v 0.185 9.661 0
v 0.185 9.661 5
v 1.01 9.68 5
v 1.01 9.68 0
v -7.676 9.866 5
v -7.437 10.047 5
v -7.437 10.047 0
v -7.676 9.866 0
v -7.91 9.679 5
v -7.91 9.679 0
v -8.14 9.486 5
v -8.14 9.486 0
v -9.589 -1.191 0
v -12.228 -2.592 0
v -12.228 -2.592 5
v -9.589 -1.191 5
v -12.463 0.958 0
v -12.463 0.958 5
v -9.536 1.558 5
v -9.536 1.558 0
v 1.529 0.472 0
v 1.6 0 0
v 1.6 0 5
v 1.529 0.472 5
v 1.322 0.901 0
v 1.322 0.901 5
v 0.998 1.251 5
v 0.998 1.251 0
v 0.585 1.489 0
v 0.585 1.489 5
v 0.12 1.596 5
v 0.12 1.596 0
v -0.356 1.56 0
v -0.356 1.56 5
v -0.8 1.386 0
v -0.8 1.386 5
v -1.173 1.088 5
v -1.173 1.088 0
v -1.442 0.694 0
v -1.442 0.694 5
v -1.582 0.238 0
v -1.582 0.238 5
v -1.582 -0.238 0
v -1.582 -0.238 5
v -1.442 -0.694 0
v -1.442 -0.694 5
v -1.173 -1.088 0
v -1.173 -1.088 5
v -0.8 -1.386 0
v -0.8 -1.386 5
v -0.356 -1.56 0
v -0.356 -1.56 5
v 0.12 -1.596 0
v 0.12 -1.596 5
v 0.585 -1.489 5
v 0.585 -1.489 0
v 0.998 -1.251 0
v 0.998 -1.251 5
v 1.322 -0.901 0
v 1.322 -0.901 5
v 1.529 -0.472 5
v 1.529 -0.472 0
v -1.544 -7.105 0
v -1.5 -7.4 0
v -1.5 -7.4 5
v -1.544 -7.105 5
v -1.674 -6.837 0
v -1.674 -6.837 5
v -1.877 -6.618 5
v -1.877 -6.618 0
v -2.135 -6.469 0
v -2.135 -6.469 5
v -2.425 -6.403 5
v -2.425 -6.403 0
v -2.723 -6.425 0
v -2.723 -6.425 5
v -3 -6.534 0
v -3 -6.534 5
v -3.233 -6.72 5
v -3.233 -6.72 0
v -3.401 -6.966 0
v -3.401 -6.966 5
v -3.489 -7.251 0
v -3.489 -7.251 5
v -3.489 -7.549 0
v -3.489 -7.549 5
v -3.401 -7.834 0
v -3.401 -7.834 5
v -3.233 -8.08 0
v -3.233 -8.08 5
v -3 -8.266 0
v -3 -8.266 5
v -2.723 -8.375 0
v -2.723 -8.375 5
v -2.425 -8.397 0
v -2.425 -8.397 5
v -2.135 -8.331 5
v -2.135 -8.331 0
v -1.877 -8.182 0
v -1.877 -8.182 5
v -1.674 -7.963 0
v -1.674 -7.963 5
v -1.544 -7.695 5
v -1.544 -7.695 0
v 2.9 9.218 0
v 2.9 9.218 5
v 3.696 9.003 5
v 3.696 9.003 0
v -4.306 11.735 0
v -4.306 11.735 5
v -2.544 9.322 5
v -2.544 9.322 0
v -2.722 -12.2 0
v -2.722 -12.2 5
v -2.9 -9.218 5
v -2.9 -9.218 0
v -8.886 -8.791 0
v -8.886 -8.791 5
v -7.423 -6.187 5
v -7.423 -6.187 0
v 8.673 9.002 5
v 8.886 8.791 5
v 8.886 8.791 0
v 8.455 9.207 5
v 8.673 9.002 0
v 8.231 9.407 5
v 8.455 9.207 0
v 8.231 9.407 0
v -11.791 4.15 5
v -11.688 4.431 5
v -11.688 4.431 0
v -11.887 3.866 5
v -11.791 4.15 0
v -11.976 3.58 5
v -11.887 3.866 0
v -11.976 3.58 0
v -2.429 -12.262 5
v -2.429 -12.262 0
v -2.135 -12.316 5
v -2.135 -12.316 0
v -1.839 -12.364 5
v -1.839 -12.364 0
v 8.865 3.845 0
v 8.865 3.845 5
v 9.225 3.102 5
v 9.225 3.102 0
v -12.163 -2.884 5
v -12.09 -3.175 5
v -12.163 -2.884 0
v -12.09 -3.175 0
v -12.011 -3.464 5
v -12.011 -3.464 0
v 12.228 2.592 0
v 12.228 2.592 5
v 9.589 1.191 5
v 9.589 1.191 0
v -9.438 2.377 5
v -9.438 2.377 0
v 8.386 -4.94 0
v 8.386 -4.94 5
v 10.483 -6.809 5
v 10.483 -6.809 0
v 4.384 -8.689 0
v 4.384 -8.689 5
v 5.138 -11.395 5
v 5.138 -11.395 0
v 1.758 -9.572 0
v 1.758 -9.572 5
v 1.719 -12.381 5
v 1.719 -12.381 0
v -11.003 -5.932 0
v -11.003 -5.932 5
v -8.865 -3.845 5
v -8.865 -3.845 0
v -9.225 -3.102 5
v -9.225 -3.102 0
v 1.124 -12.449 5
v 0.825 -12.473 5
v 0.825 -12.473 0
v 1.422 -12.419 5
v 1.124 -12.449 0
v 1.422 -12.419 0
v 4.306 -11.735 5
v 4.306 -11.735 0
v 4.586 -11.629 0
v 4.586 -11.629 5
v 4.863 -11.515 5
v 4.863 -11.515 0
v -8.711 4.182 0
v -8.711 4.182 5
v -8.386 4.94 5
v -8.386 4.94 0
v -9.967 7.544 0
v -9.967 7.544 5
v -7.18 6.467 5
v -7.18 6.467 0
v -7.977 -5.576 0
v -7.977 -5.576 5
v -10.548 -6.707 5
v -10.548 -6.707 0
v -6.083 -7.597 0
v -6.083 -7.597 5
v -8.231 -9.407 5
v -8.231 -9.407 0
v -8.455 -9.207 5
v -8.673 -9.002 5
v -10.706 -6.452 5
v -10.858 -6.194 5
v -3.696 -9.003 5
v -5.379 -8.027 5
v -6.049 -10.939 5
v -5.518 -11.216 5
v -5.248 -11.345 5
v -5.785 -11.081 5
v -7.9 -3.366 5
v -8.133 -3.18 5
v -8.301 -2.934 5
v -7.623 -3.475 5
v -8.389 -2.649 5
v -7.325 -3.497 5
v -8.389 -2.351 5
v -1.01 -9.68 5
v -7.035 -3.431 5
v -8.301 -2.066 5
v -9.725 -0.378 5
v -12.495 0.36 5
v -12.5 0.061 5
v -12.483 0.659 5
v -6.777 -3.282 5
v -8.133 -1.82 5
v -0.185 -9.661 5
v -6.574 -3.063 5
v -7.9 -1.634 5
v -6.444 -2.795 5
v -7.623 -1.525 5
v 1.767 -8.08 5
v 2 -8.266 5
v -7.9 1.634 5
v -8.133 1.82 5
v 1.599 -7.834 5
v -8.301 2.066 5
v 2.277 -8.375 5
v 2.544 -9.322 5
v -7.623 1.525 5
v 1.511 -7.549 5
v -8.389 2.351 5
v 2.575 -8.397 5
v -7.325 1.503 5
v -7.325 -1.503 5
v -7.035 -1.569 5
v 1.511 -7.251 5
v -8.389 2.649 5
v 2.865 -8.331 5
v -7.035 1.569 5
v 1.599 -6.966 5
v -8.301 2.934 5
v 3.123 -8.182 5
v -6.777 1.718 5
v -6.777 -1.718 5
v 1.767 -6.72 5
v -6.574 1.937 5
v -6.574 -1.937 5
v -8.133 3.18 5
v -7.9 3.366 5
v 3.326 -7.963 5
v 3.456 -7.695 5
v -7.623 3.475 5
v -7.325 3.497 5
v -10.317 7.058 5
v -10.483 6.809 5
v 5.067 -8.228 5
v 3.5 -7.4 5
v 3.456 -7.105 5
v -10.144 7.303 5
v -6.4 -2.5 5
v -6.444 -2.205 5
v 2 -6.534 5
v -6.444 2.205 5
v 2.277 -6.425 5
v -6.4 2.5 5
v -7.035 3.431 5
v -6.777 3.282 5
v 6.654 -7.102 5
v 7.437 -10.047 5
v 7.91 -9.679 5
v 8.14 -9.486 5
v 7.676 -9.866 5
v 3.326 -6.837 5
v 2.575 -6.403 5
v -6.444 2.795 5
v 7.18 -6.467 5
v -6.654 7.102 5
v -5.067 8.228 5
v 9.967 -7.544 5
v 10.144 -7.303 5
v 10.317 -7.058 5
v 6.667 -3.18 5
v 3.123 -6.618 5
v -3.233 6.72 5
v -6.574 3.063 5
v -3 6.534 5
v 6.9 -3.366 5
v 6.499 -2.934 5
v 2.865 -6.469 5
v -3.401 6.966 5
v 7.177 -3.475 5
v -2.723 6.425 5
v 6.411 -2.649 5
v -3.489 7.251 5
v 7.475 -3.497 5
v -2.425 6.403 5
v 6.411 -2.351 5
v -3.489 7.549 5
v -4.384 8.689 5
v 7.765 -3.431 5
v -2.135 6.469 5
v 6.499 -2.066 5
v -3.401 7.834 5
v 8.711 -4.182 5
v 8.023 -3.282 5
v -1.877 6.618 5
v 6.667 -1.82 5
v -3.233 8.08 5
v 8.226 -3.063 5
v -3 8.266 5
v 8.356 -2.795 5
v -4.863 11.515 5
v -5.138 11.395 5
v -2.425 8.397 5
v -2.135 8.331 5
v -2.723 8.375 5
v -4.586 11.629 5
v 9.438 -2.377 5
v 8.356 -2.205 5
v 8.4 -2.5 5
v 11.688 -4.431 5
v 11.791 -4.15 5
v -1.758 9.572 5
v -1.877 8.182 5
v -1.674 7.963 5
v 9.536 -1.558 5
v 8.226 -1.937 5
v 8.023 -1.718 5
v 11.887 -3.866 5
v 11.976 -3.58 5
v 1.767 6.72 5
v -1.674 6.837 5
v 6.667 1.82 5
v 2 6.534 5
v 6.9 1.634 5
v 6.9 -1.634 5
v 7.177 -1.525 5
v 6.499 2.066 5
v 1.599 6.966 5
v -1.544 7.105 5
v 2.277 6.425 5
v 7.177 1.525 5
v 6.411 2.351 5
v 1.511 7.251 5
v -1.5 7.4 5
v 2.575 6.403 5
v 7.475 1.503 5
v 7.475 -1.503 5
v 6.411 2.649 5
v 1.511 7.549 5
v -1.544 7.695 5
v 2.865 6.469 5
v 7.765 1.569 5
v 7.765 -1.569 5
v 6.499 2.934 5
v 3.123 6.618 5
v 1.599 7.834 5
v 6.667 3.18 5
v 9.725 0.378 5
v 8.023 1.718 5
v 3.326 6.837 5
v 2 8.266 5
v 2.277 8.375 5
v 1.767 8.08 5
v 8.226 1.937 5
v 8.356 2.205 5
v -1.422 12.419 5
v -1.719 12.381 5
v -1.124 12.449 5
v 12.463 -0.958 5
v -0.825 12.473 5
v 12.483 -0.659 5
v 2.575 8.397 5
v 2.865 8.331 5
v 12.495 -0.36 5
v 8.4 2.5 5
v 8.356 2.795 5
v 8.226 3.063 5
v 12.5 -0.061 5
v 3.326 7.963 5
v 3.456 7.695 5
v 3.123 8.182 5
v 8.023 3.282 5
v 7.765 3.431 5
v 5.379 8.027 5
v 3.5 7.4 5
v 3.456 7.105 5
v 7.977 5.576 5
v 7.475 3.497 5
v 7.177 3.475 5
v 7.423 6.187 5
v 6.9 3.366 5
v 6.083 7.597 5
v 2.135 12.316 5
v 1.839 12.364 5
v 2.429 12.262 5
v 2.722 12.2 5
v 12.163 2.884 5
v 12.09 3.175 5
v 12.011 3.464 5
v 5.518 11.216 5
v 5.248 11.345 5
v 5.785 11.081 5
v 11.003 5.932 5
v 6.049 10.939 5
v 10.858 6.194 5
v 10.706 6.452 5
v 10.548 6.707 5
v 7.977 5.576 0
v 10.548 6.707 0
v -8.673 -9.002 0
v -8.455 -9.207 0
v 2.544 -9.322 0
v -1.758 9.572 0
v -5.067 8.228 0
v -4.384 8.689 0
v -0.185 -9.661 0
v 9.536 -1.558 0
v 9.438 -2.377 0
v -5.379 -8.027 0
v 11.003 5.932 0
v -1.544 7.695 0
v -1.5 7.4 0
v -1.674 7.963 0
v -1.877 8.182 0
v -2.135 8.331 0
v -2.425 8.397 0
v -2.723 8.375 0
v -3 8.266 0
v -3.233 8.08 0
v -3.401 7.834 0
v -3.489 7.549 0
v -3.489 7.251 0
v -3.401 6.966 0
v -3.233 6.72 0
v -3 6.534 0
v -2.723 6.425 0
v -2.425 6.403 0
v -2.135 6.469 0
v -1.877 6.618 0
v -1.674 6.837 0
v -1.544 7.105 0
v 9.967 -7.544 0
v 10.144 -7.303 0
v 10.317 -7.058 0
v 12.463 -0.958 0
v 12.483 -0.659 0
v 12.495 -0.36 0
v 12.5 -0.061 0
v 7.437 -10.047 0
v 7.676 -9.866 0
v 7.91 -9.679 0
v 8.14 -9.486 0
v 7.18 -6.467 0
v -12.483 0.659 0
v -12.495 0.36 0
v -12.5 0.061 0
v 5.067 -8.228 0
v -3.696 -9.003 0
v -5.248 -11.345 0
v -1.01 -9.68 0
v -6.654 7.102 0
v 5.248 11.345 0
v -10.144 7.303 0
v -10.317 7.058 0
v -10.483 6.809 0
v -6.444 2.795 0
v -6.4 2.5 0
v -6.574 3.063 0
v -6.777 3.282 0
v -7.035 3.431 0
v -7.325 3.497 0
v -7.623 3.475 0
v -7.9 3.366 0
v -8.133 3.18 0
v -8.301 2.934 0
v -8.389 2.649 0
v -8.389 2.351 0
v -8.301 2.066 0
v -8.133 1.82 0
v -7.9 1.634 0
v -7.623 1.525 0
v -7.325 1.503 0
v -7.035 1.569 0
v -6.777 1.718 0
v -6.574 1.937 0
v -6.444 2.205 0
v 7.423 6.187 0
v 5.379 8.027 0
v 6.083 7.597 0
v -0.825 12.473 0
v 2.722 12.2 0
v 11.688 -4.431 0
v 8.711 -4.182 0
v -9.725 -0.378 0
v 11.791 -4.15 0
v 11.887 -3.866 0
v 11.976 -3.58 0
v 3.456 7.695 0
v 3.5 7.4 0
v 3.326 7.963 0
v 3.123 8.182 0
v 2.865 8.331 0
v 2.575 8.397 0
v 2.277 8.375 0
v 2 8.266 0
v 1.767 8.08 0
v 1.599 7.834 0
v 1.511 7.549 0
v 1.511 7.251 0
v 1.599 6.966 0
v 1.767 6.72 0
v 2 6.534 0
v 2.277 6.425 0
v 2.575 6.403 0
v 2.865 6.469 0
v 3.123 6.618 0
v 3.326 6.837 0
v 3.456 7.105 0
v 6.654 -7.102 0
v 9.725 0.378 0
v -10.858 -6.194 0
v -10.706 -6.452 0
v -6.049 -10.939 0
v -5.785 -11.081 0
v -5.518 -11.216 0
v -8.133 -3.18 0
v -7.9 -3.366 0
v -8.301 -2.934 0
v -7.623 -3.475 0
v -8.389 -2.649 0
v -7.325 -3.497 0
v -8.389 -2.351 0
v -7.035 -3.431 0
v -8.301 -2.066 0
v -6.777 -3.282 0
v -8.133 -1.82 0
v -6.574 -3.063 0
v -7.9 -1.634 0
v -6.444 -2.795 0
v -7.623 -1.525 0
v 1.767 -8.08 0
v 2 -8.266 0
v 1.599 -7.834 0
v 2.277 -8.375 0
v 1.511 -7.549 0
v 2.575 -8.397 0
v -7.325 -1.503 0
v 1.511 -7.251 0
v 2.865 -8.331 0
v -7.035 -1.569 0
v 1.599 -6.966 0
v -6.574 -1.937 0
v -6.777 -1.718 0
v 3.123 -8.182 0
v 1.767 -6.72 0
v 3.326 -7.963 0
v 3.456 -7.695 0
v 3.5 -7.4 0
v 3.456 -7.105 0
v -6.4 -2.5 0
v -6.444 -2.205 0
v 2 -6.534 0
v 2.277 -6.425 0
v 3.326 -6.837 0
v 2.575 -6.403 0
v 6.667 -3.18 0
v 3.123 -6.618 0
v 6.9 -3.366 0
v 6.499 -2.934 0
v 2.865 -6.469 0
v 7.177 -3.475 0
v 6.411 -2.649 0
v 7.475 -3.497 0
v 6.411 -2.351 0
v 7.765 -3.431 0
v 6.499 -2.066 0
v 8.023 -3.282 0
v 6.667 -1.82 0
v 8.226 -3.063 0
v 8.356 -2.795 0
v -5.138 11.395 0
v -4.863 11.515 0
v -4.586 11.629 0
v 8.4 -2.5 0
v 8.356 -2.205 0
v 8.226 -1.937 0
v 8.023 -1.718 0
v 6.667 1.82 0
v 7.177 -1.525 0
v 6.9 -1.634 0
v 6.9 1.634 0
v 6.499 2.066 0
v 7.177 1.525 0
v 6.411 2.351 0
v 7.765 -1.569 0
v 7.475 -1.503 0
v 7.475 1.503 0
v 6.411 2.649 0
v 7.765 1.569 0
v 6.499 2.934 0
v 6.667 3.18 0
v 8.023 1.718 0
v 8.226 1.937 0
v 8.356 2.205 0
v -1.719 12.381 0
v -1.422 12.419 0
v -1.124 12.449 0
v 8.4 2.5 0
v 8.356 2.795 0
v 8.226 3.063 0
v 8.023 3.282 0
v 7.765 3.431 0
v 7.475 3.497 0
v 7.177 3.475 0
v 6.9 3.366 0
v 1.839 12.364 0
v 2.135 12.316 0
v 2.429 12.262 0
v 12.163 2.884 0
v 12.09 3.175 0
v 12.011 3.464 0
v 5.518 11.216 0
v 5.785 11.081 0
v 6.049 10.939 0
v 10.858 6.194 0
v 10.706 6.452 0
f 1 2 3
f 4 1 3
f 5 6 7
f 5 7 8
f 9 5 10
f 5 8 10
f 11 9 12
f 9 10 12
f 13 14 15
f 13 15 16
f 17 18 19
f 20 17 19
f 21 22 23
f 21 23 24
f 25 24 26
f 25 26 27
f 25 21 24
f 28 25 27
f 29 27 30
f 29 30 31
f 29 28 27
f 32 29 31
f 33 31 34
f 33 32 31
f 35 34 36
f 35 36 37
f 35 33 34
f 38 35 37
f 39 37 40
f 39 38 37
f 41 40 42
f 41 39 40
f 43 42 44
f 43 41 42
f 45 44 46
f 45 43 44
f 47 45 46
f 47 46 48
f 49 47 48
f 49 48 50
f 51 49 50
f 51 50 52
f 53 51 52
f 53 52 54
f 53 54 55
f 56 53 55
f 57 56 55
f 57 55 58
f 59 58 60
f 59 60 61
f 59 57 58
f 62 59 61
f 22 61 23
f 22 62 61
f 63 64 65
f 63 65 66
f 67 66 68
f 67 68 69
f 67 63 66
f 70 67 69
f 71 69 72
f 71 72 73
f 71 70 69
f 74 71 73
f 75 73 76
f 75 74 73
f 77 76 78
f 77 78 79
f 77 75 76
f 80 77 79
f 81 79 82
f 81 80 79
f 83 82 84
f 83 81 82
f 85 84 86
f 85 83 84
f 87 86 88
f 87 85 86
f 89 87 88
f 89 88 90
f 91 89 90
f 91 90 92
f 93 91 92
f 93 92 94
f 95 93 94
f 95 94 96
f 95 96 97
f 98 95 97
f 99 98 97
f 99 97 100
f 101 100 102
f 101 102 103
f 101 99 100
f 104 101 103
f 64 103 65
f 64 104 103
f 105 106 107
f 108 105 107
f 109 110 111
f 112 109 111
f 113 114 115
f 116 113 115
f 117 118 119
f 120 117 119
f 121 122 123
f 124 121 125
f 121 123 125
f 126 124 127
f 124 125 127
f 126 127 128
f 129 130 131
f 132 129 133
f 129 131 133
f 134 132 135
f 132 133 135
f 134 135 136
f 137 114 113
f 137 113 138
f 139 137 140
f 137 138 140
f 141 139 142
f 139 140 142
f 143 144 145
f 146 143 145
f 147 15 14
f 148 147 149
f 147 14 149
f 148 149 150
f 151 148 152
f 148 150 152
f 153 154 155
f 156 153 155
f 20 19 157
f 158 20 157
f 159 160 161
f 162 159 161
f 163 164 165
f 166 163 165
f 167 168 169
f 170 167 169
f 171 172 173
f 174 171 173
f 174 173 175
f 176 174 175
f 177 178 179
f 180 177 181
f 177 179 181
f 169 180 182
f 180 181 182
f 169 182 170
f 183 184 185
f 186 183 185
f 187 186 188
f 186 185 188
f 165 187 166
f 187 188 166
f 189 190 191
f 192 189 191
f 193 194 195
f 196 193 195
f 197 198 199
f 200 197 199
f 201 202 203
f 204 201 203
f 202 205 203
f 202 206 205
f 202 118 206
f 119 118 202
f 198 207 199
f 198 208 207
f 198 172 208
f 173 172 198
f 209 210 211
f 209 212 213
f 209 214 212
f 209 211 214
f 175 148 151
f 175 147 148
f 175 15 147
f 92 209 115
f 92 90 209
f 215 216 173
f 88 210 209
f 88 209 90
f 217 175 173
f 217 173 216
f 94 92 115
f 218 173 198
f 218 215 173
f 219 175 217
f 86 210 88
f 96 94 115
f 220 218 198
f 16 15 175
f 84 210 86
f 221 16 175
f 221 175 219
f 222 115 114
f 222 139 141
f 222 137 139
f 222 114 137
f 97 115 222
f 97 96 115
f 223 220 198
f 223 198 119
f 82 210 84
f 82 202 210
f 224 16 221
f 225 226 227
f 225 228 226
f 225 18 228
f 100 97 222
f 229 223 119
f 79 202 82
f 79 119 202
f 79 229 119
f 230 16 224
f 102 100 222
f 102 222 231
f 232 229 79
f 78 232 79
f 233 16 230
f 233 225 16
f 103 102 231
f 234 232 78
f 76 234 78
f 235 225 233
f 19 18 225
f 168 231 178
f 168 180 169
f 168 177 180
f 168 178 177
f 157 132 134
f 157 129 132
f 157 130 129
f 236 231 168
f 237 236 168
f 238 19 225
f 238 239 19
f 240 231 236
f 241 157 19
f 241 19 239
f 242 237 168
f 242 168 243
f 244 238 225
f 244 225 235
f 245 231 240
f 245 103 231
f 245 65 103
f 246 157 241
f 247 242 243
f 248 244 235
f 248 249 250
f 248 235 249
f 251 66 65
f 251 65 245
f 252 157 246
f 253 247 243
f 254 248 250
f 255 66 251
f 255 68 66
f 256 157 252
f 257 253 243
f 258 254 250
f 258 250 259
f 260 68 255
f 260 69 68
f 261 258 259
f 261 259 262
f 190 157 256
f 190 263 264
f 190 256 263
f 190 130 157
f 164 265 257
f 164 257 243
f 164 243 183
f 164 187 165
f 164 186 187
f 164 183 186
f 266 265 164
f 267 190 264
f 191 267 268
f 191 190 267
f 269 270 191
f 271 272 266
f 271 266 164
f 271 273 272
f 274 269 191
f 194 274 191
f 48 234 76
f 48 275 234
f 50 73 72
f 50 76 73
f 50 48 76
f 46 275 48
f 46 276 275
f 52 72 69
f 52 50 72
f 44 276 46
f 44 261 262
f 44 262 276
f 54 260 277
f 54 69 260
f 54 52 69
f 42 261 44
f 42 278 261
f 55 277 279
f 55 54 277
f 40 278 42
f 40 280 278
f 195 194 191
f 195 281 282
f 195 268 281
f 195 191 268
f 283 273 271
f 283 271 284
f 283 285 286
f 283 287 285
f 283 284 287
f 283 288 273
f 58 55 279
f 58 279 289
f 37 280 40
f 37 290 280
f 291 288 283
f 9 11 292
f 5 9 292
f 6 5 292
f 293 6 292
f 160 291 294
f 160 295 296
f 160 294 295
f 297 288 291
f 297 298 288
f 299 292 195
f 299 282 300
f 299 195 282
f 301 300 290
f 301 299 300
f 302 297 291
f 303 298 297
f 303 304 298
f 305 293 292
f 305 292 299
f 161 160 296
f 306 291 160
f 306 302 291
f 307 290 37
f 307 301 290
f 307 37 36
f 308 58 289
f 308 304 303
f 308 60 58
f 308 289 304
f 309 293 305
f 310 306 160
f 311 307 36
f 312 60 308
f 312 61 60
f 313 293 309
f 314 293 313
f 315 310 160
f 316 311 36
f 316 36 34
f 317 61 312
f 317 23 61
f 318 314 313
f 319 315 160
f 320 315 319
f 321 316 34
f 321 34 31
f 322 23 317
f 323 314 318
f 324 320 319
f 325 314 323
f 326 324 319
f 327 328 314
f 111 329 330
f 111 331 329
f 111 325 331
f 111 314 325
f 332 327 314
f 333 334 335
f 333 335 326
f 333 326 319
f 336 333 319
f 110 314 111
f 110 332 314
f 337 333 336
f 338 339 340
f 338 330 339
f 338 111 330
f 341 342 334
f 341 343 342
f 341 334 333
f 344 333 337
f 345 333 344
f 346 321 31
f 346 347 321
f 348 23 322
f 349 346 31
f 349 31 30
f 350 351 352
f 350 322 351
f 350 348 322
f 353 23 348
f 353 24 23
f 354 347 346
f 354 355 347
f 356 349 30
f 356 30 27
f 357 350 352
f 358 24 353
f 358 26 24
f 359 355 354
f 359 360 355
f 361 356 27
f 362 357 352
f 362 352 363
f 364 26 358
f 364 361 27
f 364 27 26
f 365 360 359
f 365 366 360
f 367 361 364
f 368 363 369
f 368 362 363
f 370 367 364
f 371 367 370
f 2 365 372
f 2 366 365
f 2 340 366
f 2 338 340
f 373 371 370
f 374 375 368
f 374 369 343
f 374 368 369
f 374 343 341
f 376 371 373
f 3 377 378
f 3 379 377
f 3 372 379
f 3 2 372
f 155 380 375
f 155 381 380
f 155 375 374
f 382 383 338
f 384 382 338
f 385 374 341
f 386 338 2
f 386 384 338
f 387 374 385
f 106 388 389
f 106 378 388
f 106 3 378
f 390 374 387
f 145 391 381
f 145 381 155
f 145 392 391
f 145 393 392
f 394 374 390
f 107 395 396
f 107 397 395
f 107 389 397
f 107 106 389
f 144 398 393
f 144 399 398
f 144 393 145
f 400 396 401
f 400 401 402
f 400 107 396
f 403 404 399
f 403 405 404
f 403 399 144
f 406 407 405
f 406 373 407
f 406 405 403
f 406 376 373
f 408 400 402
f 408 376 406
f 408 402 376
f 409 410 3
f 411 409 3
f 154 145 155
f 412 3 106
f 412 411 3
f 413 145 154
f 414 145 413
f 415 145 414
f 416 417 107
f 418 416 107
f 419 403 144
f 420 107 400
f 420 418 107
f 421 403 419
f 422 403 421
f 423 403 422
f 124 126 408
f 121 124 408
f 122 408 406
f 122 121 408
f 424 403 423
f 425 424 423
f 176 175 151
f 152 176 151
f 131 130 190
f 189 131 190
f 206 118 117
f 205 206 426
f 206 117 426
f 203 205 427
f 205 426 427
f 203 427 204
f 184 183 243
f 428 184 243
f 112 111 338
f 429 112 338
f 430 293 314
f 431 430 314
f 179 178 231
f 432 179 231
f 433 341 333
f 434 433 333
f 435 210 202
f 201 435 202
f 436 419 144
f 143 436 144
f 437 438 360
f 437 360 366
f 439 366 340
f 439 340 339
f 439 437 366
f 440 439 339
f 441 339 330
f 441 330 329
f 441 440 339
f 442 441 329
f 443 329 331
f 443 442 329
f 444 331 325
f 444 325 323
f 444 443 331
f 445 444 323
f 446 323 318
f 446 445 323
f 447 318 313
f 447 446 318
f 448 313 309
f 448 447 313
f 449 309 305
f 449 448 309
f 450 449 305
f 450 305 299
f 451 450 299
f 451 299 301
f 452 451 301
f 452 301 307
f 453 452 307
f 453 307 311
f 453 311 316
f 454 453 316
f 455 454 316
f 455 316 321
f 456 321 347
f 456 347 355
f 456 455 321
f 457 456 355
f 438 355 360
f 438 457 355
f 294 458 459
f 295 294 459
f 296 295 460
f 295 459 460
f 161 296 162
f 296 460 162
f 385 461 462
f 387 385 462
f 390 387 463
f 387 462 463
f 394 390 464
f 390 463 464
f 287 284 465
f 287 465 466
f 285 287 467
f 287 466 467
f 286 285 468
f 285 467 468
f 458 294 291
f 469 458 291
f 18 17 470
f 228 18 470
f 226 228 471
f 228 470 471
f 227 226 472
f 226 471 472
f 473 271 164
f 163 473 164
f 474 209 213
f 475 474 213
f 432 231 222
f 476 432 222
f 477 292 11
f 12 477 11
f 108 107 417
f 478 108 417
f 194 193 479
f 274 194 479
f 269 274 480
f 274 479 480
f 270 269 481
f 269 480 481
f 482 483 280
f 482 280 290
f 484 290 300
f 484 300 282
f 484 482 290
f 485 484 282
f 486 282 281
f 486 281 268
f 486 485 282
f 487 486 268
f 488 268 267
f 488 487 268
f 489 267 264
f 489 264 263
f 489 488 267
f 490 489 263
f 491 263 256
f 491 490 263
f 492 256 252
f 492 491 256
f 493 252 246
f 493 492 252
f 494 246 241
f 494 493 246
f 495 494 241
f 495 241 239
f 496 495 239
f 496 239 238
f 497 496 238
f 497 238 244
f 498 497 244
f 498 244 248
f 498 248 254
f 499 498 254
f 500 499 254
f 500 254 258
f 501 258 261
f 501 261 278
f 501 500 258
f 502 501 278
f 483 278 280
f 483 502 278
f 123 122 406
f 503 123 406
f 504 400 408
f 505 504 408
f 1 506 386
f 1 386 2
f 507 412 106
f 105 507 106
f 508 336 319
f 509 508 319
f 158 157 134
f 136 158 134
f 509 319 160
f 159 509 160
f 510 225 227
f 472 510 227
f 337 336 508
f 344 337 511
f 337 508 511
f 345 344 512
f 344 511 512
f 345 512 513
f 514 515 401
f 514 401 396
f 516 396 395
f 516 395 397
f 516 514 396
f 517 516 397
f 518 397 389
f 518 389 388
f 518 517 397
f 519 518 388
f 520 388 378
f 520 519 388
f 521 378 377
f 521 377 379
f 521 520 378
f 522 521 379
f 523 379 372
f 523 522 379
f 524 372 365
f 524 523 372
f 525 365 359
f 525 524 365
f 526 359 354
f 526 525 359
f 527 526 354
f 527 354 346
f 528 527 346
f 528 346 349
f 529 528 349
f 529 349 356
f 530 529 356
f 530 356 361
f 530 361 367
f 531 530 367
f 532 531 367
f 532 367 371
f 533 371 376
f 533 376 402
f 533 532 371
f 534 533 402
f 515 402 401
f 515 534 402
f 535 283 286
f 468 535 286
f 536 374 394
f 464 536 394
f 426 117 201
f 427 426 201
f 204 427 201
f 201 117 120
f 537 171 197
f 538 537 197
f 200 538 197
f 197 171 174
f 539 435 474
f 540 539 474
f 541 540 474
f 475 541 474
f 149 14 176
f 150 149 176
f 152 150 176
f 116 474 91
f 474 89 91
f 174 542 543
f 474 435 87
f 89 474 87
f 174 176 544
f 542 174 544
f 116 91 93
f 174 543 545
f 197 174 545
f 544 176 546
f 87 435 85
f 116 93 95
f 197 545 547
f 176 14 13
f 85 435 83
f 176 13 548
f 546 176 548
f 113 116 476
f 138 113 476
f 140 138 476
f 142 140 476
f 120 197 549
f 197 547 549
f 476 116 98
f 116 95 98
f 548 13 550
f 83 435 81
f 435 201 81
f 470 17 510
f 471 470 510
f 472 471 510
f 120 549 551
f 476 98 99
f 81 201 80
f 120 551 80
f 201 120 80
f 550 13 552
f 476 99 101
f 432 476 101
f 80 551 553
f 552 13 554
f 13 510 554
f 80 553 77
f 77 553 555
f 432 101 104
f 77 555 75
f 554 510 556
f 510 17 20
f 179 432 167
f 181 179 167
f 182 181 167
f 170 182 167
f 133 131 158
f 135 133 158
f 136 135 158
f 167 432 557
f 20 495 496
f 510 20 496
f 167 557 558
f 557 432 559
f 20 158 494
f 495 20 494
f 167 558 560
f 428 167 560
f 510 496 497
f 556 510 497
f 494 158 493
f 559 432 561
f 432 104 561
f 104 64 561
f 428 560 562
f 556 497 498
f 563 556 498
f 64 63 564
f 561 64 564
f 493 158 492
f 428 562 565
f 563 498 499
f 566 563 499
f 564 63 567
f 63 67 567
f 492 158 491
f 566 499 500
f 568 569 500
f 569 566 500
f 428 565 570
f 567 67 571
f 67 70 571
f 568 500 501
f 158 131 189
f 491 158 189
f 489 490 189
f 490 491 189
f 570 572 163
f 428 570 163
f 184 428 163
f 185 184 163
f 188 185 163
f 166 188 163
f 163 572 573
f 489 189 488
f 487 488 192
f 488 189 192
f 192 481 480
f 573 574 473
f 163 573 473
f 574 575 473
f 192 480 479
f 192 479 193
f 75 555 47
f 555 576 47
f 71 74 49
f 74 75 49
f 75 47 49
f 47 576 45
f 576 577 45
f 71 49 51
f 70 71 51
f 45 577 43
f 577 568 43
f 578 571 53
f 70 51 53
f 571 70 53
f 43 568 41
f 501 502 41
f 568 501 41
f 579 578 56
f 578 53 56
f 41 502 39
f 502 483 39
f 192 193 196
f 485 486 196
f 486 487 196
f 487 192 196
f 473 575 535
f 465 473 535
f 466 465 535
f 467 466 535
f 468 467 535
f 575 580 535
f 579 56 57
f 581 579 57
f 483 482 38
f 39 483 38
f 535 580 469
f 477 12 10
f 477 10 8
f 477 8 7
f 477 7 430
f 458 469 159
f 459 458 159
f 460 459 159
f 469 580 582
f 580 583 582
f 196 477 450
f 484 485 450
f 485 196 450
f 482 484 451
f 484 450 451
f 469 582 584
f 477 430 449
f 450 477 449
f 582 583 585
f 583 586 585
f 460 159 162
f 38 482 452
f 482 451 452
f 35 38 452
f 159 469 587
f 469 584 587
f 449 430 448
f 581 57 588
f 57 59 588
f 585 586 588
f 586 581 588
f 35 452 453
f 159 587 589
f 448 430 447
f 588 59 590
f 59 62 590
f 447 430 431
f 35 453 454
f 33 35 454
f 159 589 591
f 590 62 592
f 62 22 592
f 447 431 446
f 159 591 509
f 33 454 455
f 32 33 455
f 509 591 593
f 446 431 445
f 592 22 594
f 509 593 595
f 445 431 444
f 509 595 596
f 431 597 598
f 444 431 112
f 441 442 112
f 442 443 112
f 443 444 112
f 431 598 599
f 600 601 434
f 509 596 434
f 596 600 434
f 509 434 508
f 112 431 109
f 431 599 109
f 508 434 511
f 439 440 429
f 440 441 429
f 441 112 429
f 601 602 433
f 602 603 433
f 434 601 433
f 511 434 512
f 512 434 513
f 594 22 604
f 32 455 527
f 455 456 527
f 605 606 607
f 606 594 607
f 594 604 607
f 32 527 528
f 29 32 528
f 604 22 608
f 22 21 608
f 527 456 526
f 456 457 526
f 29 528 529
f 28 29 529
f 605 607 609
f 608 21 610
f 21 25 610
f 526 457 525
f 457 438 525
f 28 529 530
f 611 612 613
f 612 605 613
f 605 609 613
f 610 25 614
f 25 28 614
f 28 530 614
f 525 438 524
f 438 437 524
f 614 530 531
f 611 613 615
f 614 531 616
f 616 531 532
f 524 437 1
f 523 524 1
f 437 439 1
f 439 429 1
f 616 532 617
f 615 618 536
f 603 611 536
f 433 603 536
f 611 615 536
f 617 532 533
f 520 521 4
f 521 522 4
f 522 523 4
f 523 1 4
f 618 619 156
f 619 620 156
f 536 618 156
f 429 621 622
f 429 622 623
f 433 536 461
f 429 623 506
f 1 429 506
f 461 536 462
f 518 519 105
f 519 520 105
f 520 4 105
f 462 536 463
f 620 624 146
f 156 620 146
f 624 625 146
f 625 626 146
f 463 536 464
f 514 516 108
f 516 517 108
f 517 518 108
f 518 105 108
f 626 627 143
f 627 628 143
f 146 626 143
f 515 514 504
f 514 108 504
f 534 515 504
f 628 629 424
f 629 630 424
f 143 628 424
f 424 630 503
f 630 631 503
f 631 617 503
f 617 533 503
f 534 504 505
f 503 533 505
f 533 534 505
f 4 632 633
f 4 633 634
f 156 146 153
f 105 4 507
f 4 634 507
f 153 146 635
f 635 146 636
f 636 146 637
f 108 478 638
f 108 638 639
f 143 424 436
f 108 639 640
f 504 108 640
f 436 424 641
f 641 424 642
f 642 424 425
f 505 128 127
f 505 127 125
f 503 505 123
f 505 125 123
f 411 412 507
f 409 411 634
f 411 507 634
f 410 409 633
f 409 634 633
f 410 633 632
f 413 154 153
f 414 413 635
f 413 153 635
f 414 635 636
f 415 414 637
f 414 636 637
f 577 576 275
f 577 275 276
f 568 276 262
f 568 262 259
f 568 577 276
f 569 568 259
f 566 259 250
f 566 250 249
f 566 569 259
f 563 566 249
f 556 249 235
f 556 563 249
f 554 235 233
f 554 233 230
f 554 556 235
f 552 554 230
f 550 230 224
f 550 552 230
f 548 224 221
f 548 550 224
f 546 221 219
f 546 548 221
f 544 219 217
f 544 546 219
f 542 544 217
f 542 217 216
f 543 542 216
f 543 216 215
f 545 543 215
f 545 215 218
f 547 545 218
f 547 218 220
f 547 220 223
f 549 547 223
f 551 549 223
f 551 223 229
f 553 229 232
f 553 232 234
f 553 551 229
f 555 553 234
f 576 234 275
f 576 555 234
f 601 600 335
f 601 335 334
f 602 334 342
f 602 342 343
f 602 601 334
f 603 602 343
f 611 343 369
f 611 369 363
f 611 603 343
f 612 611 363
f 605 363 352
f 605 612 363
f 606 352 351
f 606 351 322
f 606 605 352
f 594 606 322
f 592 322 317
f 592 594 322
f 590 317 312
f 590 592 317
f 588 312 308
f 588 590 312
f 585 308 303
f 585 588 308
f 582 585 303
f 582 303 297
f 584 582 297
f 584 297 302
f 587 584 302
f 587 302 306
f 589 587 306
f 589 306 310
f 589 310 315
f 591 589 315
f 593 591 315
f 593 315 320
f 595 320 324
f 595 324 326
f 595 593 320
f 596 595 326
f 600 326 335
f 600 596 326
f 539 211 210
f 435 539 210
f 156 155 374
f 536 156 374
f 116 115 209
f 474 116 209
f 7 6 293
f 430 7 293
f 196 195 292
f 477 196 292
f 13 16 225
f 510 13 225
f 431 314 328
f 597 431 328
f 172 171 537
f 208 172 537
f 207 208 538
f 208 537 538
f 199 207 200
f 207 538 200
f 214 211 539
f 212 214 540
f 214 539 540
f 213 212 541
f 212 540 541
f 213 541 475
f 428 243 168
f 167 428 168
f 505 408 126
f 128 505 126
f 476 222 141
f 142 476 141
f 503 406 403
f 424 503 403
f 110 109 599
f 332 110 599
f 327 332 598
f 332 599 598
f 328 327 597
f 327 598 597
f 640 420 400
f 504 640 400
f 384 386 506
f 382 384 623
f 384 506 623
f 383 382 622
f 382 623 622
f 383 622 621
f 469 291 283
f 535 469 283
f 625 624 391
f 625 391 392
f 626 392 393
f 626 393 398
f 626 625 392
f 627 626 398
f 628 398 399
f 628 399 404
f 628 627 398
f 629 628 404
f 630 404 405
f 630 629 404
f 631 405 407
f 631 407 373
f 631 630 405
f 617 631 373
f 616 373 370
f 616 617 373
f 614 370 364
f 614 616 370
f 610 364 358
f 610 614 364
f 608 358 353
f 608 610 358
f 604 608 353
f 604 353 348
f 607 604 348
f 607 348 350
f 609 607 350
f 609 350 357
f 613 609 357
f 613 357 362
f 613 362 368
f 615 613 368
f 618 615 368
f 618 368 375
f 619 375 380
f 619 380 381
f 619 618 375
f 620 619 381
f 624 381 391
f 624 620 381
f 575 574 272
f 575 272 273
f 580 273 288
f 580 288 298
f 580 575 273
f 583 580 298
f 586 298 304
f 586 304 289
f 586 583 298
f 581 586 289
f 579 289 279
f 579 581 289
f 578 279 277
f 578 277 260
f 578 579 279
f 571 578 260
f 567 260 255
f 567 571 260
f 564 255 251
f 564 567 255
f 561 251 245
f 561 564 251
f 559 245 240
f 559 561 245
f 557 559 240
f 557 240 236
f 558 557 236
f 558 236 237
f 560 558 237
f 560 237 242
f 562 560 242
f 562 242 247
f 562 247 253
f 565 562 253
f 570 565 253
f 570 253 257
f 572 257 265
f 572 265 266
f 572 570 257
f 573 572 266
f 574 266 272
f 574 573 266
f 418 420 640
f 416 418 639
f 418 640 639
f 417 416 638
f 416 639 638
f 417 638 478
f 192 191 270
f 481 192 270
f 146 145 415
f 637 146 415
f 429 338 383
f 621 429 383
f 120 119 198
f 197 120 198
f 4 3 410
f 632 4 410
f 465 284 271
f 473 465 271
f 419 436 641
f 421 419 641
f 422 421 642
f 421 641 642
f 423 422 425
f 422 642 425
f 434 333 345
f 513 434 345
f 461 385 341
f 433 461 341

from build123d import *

# Parameters (mm, degrees)
SKETCH1_R           = 12.5
SKETCH1_R_2         = 1.6
SKETCH1_R_3         = 1
BOSS_EXTRUDE1_DEPTH = 5
CUT_EXTRUDE1_DEPTH  = 6
CIRPATTERN1_COUNT   = 22


with BuildPart() as part:
    # Sketch1 → Boss-Extrude1 (new body)
    with BuildSketch(Plane.XY):
        Circle(SKETCH1_R)
        Circle(SKETCH1_R_2, mode=Mode.SUBTRACT)
        with Locations((-2.5, 7.4)):
            Circle(SKETCH1_R_3, mode=Mode.SUBTRACT)
        with Locations((2.5, 7.4)):
            Circle(SKETCH1_R_3, mode=Mode.SUBTRACT)
        with Locations((2.5, -7.4)):
            Circle(SKETCH1_R_3, mode=Mode.SUBTRACT)
        with Locations((-2.5, -7.4)):
            Circle(SKETCH1_R_3, mode=Mode.SUBTRACT)
        with Locations((7.4, -2.5)):
            Circle(SKETCH1_R_3, mode=Mode.SUBTRACT)
        with Locations((7.4, 2.5)):
            Circle(SKETCH1_R_3, mode=Mode.SUBTRACT)
        with Locations((-7.4, 2.5)):
            Circle(SKETCH1_R_3, mode=Mode.SUBTRACT)
        with Locations((-7.4, -2.5)):
            Circle(SKETCH1_R_3, mode=Mode.SUBTRACT)
    extrude(amount=BOSS_EXTRUDE1_DEPTH)

    # Sketch2 → Cut-Extrude1 (cut, through all)
    with BuildSketch(Plane.XY.offset(5)):
        Polygon((-5.188791036, 11.579242099), (-7.447104706, 10.054235749), (-5.067298356, 8.22762092), (-4.383588712, 8.68932009), align=None)
    cut_extrude1 = extrude(amount=-CUT_EXTRUDE1_DEPTH, mode=Mode.SUBTRACT)

    # CirPattern1: Cut-Extrude1 ×22 about axis
    cirpattern1_axis = Axis((0, 0, 0), (0, 0, 1))
    for i in range(1, CIRPATTERN1_COUNT):
        add(cut_extrude1.rotate(cirpattern1_axis, i * 360 / CIRPATTERN1_COUNT), mode=Mode.SUBTRACT)


solid = part.part
